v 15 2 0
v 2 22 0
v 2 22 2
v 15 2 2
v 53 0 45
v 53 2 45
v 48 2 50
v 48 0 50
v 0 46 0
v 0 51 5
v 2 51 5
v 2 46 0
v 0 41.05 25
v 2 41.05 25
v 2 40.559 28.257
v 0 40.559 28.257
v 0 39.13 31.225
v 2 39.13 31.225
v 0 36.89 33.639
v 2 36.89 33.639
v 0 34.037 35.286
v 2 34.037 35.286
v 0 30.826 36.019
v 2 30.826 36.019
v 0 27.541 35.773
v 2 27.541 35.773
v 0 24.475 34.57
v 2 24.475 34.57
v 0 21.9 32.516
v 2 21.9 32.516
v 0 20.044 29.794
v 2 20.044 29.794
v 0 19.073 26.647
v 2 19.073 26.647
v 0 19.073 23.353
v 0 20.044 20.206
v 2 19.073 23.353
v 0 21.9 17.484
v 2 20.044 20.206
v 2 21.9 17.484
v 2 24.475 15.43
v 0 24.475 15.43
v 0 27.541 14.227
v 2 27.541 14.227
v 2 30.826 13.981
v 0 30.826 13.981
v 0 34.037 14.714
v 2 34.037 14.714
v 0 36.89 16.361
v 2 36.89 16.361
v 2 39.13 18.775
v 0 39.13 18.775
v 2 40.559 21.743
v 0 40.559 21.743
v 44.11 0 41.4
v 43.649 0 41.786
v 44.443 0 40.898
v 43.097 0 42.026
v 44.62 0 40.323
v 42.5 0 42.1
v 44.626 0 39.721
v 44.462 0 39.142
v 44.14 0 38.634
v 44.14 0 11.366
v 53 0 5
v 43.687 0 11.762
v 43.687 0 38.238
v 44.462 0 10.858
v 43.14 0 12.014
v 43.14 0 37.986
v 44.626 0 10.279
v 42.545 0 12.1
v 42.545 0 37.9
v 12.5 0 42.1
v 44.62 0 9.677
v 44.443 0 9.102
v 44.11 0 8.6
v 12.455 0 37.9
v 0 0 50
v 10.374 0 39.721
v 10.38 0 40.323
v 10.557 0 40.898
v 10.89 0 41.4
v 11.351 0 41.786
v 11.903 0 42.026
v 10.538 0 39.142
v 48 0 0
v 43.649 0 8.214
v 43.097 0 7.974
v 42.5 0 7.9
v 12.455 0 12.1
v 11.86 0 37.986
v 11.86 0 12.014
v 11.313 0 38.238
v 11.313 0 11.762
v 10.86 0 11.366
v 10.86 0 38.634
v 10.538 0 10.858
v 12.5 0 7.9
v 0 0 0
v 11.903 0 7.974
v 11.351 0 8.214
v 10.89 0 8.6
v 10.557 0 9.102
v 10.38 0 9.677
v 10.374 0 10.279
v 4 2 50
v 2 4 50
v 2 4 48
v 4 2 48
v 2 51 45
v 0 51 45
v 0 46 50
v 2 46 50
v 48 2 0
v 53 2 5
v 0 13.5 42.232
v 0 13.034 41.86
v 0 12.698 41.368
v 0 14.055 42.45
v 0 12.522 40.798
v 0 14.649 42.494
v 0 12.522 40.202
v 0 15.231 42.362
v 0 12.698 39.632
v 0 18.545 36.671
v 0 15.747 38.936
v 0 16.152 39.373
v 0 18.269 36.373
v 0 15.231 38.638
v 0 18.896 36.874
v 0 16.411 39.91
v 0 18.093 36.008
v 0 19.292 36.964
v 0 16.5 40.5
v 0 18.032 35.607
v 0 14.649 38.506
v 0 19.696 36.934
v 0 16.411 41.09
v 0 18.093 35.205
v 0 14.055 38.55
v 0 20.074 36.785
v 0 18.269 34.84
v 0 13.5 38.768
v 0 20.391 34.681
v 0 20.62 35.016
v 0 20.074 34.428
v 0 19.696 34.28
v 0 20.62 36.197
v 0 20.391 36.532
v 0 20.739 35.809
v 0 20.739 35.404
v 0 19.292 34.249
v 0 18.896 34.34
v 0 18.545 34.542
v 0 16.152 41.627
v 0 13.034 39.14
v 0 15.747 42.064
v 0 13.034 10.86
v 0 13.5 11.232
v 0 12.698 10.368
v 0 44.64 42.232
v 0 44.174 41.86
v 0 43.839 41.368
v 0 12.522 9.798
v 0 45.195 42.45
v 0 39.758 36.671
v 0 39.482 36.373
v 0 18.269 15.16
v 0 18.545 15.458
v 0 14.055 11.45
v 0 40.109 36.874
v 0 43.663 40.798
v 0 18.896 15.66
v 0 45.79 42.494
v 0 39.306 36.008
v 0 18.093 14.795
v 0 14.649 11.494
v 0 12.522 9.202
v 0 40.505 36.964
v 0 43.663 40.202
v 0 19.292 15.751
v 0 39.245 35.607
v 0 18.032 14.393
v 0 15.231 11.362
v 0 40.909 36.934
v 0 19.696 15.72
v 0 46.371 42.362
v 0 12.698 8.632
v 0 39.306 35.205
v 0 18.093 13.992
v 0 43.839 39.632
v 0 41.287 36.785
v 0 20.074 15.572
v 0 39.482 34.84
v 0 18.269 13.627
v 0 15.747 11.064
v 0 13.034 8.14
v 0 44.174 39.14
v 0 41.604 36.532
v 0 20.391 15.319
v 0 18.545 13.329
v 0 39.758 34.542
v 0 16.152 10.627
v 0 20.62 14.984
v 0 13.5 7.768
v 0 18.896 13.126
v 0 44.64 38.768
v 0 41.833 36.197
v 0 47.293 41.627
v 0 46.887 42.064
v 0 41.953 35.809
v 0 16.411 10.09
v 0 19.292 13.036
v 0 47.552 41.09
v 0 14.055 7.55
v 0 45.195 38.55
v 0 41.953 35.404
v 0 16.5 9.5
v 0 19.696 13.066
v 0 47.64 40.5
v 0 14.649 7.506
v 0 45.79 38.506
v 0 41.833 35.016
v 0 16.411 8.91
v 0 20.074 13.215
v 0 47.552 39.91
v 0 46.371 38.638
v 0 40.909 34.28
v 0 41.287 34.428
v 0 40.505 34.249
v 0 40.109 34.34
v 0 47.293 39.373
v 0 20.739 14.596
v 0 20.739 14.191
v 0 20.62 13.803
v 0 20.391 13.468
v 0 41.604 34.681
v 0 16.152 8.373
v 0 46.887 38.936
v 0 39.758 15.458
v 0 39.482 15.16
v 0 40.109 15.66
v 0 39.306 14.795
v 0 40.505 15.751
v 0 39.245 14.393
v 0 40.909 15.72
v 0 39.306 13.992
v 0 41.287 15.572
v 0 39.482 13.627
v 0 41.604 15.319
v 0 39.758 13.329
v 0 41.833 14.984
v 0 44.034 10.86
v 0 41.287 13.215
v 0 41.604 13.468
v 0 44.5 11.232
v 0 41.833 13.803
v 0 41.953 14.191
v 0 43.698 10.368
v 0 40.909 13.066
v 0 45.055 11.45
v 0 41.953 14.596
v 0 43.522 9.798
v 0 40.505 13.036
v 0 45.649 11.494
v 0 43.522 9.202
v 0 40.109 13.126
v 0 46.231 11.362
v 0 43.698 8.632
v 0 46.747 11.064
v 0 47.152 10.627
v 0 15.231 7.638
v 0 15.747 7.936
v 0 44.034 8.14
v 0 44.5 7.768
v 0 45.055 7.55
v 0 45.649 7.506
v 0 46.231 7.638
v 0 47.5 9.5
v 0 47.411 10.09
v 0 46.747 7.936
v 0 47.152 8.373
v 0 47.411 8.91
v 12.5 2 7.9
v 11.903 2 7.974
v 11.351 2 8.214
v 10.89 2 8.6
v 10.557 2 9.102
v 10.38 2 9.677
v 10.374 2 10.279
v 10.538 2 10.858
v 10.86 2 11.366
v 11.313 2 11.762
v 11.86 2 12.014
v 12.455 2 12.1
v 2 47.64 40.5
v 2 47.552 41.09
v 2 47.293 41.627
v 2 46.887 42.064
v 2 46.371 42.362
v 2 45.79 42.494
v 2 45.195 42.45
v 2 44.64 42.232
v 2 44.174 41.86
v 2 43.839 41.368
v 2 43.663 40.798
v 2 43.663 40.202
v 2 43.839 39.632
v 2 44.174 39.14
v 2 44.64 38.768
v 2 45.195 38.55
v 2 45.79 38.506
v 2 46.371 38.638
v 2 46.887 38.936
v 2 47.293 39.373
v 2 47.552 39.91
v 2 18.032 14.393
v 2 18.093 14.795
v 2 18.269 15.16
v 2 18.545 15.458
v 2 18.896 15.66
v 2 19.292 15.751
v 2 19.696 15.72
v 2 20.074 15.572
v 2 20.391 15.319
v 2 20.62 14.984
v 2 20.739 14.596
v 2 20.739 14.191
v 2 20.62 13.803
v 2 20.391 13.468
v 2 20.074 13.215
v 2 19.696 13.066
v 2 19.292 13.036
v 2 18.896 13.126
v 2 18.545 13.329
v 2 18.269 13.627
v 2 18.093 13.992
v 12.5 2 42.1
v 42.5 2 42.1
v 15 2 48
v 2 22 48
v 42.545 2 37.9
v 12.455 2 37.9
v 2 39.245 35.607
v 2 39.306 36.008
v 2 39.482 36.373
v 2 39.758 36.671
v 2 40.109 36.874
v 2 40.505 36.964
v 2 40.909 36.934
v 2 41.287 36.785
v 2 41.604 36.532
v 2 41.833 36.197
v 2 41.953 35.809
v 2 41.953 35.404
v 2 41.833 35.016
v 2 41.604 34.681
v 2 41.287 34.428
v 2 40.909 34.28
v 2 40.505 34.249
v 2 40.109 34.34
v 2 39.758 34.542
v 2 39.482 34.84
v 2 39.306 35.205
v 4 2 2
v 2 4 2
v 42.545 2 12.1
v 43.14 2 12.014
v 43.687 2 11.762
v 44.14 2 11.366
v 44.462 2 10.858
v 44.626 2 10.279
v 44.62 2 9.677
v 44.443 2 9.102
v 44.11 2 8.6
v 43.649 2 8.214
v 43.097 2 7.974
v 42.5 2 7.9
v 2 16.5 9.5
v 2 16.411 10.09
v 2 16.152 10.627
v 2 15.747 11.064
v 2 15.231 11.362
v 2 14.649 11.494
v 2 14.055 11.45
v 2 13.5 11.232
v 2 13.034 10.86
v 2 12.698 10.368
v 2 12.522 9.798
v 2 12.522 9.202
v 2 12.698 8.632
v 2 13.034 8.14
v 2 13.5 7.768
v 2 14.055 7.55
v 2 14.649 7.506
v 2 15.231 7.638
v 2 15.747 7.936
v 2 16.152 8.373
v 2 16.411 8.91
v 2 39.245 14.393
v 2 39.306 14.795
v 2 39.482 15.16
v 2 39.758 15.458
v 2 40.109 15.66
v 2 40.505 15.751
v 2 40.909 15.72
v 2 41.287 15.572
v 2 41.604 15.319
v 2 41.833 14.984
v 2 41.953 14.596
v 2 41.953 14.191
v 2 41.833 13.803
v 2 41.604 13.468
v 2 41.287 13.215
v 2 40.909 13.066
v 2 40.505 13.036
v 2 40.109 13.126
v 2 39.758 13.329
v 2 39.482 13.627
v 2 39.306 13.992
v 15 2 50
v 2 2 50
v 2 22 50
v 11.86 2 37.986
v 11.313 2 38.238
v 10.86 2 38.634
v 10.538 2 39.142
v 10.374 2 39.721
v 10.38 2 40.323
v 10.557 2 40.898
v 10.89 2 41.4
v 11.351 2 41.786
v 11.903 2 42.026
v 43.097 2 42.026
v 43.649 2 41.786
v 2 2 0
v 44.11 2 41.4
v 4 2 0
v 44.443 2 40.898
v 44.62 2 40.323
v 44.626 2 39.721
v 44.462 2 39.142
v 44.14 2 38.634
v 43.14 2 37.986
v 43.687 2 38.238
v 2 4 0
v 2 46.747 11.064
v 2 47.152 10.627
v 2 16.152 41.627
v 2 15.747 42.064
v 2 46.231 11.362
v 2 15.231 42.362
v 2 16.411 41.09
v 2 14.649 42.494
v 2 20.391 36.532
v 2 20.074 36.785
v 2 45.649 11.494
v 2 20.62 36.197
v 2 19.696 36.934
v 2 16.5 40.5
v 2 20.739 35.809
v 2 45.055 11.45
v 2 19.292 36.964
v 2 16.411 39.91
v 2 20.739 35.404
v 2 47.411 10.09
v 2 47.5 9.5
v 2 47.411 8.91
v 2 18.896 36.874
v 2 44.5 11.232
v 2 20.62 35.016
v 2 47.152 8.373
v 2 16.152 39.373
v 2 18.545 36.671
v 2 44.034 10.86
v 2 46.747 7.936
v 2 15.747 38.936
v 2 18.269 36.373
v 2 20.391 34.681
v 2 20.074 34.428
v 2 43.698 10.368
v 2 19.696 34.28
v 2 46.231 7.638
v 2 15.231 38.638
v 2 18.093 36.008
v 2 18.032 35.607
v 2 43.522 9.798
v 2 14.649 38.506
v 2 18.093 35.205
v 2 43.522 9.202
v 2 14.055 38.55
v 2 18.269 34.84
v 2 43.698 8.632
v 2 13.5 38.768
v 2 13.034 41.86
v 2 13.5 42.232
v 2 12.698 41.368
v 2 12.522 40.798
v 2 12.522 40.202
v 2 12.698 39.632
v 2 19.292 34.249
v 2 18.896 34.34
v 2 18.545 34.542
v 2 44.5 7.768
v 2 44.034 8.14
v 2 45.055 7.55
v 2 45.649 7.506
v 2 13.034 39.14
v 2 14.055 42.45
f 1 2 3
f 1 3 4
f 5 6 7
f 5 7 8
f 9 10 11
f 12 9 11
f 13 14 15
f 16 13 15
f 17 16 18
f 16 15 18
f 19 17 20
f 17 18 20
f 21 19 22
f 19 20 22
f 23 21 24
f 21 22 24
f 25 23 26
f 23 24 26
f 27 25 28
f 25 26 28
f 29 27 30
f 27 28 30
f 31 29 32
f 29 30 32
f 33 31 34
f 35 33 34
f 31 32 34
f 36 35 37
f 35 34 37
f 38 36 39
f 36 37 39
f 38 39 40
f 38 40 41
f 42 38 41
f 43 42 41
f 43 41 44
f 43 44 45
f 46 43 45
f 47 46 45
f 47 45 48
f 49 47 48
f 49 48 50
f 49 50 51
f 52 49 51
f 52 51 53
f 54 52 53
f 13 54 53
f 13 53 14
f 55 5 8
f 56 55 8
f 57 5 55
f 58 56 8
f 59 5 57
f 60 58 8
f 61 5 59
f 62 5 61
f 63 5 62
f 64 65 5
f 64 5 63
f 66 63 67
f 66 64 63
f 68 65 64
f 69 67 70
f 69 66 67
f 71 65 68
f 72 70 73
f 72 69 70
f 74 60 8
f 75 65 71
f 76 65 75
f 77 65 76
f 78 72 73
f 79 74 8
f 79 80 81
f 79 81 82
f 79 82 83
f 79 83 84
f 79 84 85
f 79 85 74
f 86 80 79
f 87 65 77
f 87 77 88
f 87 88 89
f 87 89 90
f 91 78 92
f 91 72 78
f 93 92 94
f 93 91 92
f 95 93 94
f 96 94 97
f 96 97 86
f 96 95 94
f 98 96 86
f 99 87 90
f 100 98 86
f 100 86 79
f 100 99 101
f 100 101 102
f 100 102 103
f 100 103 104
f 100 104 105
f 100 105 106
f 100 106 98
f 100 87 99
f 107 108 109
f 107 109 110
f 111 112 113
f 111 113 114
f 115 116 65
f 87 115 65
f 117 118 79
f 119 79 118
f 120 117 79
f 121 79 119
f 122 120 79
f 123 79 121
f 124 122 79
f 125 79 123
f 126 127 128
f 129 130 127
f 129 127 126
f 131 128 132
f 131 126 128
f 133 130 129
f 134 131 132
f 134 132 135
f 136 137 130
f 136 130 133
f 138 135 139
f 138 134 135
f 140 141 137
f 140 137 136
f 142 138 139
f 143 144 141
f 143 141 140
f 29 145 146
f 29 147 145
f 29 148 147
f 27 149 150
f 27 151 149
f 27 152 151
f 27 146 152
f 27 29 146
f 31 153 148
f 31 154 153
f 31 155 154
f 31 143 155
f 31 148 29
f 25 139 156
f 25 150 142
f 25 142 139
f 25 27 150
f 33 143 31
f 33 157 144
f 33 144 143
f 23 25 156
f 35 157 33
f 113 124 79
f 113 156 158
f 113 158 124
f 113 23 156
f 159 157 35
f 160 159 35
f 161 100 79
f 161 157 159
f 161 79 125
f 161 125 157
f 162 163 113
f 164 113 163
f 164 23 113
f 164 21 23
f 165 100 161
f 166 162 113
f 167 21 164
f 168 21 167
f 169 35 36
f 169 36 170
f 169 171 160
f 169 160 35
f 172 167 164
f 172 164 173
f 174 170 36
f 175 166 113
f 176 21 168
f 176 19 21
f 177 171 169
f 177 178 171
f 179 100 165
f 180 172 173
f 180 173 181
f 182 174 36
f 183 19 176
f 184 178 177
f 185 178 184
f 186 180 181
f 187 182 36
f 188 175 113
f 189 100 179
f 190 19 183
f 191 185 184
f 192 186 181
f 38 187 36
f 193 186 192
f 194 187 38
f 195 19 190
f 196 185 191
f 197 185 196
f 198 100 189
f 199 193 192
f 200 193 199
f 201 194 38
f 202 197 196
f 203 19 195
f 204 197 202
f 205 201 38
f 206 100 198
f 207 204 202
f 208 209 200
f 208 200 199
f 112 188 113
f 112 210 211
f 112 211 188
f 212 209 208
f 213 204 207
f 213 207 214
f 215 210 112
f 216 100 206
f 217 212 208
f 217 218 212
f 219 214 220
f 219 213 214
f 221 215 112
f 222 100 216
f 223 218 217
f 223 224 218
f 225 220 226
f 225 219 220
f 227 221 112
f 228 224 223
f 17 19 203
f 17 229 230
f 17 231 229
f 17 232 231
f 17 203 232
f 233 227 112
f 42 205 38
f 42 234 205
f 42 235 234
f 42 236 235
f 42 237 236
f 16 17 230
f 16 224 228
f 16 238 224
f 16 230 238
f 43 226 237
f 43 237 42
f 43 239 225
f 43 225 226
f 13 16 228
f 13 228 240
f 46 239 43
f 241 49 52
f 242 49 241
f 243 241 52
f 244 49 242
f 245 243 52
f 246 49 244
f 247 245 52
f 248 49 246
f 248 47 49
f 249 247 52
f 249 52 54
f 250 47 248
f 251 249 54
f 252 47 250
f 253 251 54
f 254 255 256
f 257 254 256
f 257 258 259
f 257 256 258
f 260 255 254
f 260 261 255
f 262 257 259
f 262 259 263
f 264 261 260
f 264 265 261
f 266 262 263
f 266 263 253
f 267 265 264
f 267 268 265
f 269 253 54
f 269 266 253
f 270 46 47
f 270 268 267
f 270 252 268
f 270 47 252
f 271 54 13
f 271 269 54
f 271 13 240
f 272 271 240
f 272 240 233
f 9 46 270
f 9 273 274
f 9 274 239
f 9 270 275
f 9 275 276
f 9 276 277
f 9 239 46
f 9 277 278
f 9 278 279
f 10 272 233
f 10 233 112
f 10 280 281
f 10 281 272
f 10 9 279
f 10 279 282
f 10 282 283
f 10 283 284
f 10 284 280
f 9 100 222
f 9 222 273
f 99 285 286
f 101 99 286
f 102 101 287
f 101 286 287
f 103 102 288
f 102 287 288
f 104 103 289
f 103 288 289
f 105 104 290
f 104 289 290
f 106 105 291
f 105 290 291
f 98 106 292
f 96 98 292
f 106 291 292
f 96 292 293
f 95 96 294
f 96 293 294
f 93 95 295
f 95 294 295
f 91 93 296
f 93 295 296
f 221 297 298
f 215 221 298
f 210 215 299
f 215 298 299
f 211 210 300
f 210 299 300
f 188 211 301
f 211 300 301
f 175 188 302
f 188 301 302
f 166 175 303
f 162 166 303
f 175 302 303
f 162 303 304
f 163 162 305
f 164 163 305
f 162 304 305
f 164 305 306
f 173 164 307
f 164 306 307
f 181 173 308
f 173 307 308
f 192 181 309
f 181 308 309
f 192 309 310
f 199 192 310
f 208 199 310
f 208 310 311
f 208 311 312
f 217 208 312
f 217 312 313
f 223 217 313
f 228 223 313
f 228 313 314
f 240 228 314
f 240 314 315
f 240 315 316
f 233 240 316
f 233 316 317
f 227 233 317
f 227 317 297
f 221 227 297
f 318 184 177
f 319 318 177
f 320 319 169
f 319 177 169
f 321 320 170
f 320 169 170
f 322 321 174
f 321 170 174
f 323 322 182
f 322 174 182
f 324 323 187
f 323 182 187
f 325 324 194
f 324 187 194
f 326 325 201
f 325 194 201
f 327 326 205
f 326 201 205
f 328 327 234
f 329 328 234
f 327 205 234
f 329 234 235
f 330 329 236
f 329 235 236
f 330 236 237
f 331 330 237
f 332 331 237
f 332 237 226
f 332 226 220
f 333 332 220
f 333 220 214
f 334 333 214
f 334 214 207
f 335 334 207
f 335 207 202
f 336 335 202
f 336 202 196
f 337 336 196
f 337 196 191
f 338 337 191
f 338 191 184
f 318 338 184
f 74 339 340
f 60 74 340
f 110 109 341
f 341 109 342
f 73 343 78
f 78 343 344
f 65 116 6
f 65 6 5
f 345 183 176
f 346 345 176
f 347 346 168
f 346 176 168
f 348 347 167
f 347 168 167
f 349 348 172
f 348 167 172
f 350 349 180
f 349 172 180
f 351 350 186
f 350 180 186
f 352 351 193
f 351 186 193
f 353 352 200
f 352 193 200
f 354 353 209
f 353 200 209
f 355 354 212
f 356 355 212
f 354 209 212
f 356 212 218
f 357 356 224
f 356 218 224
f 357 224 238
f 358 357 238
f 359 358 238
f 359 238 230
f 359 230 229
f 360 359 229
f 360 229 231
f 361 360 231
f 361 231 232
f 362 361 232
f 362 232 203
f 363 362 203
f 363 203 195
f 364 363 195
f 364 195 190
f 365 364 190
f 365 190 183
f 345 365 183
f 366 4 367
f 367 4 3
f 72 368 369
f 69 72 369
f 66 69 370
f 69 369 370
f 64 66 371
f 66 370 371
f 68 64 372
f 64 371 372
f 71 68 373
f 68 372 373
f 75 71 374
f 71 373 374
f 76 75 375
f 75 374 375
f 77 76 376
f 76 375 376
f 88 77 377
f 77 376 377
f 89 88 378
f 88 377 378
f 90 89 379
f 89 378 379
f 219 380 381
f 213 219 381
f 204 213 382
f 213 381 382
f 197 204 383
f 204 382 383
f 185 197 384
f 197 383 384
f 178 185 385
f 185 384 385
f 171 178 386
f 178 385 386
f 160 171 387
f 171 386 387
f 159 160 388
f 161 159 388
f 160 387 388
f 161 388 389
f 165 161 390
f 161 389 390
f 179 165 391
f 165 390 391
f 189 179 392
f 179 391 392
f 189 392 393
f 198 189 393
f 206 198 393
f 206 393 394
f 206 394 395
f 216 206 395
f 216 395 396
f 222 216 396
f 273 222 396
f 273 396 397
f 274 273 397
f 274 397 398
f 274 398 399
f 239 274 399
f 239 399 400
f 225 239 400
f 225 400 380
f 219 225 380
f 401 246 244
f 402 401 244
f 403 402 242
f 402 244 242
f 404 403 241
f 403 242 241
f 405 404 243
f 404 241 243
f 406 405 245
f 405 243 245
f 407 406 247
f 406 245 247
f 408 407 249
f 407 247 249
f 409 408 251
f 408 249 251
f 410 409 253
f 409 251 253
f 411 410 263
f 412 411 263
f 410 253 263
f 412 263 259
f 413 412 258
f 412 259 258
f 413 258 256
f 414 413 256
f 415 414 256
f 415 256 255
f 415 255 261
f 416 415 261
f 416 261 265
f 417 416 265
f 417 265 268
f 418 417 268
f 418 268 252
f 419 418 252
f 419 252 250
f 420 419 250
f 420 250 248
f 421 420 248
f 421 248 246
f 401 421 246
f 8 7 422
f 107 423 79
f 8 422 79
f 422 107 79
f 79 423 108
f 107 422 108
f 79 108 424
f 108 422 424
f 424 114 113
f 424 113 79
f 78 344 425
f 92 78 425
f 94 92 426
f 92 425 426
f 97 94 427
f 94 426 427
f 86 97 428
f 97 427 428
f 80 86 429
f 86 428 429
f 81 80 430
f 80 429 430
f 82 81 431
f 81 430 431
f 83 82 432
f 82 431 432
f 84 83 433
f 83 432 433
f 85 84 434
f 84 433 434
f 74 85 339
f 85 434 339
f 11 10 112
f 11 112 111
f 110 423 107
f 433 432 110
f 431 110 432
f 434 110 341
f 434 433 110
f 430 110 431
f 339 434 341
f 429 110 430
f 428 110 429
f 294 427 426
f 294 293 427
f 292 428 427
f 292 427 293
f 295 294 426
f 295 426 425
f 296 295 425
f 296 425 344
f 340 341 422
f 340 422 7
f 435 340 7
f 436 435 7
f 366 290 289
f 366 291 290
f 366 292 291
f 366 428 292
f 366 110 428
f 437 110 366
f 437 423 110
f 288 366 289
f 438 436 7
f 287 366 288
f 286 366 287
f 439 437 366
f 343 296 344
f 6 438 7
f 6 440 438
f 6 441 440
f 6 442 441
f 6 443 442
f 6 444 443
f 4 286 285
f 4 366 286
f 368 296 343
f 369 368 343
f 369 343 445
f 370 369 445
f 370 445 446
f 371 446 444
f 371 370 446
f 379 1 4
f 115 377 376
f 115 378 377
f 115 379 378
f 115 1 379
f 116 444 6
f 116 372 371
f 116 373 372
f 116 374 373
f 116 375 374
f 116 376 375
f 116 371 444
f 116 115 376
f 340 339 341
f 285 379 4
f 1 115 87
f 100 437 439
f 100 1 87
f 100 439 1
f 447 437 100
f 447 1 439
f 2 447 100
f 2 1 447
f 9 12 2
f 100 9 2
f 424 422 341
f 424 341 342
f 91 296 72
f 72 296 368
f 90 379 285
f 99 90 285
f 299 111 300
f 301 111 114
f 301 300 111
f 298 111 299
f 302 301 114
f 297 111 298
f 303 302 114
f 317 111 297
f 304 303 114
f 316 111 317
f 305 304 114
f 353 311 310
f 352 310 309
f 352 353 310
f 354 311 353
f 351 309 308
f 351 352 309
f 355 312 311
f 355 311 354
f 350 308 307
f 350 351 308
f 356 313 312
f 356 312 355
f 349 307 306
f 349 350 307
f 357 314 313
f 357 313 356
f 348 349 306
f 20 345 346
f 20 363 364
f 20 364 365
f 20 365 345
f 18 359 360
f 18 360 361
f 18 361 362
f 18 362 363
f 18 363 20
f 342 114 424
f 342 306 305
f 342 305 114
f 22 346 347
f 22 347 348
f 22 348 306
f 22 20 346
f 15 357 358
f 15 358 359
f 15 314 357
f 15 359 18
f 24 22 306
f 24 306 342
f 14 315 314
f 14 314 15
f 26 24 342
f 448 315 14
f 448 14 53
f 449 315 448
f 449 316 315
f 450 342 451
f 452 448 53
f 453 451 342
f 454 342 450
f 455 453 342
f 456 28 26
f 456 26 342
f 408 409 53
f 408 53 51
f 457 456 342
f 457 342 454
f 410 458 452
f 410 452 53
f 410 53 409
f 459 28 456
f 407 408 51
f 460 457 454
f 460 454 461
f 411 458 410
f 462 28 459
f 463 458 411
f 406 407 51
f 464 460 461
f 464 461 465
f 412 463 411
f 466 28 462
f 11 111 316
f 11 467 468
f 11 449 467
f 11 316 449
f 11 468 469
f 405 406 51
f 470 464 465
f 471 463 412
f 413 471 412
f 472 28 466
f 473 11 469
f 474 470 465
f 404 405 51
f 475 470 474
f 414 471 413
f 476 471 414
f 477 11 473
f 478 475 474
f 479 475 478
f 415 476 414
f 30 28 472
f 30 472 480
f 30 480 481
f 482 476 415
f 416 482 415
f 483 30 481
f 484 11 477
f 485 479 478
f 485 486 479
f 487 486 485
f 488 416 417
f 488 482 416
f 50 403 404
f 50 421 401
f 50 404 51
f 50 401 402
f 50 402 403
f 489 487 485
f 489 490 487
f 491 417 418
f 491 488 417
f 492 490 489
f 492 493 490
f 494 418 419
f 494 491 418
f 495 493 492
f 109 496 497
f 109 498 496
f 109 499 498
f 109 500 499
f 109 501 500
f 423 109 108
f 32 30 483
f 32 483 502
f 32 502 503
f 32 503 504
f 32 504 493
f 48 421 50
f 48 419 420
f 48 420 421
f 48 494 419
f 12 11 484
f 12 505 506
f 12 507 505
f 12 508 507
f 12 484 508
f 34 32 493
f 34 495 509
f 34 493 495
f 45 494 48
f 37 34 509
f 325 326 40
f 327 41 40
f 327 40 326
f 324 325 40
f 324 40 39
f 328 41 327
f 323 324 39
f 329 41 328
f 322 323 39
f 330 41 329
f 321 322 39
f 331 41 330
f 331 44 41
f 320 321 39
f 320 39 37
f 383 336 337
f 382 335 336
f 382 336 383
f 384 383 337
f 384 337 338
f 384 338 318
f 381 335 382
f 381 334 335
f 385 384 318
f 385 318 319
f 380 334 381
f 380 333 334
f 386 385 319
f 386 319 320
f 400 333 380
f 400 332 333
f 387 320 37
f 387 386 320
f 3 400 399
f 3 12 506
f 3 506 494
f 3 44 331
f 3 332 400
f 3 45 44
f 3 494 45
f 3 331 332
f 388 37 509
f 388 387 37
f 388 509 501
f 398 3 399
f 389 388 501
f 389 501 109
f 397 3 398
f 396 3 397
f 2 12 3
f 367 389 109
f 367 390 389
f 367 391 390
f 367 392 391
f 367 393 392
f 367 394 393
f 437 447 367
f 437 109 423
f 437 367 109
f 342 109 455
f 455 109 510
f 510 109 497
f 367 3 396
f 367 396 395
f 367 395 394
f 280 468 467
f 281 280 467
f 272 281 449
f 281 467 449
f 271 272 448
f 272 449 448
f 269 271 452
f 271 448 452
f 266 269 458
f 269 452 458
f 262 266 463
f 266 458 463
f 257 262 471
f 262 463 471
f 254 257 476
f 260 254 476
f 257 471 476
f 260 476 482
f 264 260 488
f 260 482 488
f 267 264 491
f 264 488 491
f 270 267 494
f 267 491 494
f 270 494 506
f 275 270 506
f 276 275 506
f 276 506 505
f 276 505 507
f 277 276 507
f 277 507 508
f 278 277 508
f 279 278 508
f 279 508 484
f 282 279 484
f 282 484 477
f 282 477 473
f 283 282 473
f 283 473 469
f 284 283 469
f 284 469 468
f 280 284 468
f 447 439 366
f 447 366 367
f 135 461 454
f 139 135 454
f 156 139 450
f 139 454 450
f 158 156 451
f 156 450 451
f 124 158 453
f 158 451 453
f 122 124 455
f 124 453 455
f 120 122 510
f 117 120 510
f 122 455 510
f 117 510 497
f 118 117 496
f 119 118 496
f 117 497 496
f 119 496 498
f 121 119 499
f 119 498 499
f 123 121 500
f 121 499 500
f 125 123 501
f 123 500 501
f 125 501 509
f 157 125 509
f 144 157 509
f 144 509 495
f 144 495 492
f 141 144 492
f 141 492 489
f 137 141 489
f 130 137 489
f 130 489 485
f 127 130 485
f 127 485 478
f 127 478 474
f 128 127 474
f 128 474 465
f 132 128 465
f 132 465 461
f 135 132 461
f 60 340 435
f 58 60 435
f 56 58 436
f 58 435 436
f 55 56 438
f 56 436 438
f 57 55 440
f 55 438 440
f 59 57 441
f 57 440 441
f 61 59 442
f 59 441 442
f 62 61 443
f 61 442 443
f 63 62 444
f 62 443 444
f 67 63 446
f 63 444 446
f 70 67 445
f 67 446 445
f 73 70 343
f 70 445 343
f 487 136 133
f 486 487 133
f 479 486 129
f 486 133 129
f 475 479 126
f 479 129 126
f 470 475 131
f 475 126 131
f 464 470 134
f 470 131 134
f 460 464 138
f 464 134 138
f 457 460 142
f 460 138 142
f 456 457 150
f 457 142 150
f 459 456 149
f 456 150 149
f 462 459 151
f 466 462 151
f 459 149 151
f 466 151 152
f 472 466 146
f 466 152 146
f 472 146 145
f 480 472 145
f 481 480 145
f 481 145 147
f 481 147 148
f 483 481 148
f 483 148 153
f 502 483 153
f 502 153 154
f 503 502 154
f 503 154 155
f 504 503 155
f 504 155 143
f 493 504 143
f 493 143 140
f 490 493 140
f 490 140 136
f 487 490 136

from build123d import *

# Parameters (mm, degrees)
BOSS_EXTRUDE1_DEPTH = 50
SKETCH2_R           = 11.05
SKETCH2_R_2         = 2
CUT_EXTRUDE1_DEPTH  = 88.761039192
CUT_EXTRUDE2_DEPTH  = 50
BOSS_EXTRUDE2_DEPTH = 2
BOSS_EXTRUDE3_DEPTH = 2
CHAMFER1_SIZE       = 5
SKETCH8_R           = 1.3611534
CUT_EXTRUDE3_DEPTH  = 10


with BuildPart() as part:
    # Sketch1 → Boss-Extrude1 (new body)
    with BuildSketch(Plane.XY):
        Polygon((0, 0), (0, 51), (2, 51), (2, 2), (53, 2), (53, 0), align=None)
    extrude(amount=BOSS_EXTRUDE1_DEPTH)

    # Sketch2 → Cut-Extrude1 (cut, through all)
    with BuildSketch(Plane(origin=(2, 0, 0), x_dir=(0, 0, -1), z_dir=(1, 0, 0))):
        with Locations(Location((-25, 30, 0), (0, 0, 90))):
            Circle(SKETCH2_R)
        with Locations(Location((-40.5, 45.640445987, 0), (0, 0, 90))):
            Circle(SKETCH2_R_2)
        with Locations(Location((-9.5, 45.5, 0), (0, 0, 90))):
            Circle(SKETCH2_R_2)
        with Locations(Location((-40.5, 14.5, 0), (0, 0, 90))):
            Circle(SKETCH2_R_2)
        with Locations(Location((-9.5, 14.5, 0), (0, 0, 90))):
            Circle(SKETCH2_R_2)
    extrude(amount=-CUT_EXTRUDE1_DEPTH, mode=Mode.SUBTRACT)

    # Sketch3 → Cut-Extrude2 (cut)
    with BuildSketch(Plane(origin=(0, 2, 0), x_dir=(1, 0, 0), z_dir=(0, 1, 0))):
        with BuildLine():
            Line((12.455251015, -12.1), (42.544748985, -12.1))
            ThreePointArc((42.544748985, -12.1), (44.644629774, -9.977624237), (42.5, -7.900476833))
            Line((42.5, -7.900476833), (12.5, -7.900476833))
            ThreePointArc((12.5, -7.900476833), (10.355370226, -9.977624237), (12.455251015, -12.1))
        make_face()
        with BuildLine():
            Line((12.5, -42.099523167), (42.5, -42.099523167))
            ThreePointArc((42.5, -42.099523167), (44.644629774, -40.022375763), (42.544748985, -37.9))
            Line((42.544748985, -37.9), (12.455251015, -37.9))
            ThreePointArc((12.455251015, -37.9), (10.355370226, -40.022375763), (12.5, -42.099523167))
        make_face()
    extrude(amount=-CUT_EXTRUDE2_DEPTH, mode=Mode.SUBTRACT)

    # Sketch5 → Boss-Extrude2 (add)
    with BuildSketch(Plane.XY.offset(50)):
        Polygon((2, 22), (2, 4), (4, 2), (15, 2), align=None)
    extrude(amount=-BOSS_EXTRUDE2_DEPTH)

    # Sketch6 → Boss-Extrude3 (add)
    with BuildSketch(Plane(origin=(0, 0, 0), x_dir=(-1, 0, 0), z_dir=(0, 0, -1))):
        Polygon((-4, 2), (-2, 4), (-2, 22), (-15, 2), align=None)
    extrude(amount=-BOSS_EXTRUDE3_DEPTH)

    # Chamfer1
    chamfer1_edges = [part.edges().sort_by_distance(p)[0] for p in [
        (1, 51, 50),
        (1, 51, 0),
        (53, 1, 50),
        (53, 1, 0),
    ]]
    chamfer(chamfer1_edges, length=CHAMFER1_SIZE)

    # Sketch8 → Cut-Extrude3 (cut)
    with BuildSketch(Plane.ZY):
        with Locations(Location((35.606601718, 19.393398282, 0), (0, 0, 270))):
            Circle(SKETCH8_R)
        with Locations(Location((14.393398282, 19.393398282, 0), (0, 0, 270))):
            Circle(SKETCH8_R)
        with Locations(Location((14.393398282, 40.606601718, 0), (0, 0, 270))):
            Circle(SKETCH8_R)
        with Locations(Location((35.606601718, 40.606601718, 0), (0, 0, 270))):
            Circle(SKETCH8_R)
    extrude(amount=-CUT_EXTRUDE3_DEPTH, mode=Mode.SUBTRACT)


solid = part.part
